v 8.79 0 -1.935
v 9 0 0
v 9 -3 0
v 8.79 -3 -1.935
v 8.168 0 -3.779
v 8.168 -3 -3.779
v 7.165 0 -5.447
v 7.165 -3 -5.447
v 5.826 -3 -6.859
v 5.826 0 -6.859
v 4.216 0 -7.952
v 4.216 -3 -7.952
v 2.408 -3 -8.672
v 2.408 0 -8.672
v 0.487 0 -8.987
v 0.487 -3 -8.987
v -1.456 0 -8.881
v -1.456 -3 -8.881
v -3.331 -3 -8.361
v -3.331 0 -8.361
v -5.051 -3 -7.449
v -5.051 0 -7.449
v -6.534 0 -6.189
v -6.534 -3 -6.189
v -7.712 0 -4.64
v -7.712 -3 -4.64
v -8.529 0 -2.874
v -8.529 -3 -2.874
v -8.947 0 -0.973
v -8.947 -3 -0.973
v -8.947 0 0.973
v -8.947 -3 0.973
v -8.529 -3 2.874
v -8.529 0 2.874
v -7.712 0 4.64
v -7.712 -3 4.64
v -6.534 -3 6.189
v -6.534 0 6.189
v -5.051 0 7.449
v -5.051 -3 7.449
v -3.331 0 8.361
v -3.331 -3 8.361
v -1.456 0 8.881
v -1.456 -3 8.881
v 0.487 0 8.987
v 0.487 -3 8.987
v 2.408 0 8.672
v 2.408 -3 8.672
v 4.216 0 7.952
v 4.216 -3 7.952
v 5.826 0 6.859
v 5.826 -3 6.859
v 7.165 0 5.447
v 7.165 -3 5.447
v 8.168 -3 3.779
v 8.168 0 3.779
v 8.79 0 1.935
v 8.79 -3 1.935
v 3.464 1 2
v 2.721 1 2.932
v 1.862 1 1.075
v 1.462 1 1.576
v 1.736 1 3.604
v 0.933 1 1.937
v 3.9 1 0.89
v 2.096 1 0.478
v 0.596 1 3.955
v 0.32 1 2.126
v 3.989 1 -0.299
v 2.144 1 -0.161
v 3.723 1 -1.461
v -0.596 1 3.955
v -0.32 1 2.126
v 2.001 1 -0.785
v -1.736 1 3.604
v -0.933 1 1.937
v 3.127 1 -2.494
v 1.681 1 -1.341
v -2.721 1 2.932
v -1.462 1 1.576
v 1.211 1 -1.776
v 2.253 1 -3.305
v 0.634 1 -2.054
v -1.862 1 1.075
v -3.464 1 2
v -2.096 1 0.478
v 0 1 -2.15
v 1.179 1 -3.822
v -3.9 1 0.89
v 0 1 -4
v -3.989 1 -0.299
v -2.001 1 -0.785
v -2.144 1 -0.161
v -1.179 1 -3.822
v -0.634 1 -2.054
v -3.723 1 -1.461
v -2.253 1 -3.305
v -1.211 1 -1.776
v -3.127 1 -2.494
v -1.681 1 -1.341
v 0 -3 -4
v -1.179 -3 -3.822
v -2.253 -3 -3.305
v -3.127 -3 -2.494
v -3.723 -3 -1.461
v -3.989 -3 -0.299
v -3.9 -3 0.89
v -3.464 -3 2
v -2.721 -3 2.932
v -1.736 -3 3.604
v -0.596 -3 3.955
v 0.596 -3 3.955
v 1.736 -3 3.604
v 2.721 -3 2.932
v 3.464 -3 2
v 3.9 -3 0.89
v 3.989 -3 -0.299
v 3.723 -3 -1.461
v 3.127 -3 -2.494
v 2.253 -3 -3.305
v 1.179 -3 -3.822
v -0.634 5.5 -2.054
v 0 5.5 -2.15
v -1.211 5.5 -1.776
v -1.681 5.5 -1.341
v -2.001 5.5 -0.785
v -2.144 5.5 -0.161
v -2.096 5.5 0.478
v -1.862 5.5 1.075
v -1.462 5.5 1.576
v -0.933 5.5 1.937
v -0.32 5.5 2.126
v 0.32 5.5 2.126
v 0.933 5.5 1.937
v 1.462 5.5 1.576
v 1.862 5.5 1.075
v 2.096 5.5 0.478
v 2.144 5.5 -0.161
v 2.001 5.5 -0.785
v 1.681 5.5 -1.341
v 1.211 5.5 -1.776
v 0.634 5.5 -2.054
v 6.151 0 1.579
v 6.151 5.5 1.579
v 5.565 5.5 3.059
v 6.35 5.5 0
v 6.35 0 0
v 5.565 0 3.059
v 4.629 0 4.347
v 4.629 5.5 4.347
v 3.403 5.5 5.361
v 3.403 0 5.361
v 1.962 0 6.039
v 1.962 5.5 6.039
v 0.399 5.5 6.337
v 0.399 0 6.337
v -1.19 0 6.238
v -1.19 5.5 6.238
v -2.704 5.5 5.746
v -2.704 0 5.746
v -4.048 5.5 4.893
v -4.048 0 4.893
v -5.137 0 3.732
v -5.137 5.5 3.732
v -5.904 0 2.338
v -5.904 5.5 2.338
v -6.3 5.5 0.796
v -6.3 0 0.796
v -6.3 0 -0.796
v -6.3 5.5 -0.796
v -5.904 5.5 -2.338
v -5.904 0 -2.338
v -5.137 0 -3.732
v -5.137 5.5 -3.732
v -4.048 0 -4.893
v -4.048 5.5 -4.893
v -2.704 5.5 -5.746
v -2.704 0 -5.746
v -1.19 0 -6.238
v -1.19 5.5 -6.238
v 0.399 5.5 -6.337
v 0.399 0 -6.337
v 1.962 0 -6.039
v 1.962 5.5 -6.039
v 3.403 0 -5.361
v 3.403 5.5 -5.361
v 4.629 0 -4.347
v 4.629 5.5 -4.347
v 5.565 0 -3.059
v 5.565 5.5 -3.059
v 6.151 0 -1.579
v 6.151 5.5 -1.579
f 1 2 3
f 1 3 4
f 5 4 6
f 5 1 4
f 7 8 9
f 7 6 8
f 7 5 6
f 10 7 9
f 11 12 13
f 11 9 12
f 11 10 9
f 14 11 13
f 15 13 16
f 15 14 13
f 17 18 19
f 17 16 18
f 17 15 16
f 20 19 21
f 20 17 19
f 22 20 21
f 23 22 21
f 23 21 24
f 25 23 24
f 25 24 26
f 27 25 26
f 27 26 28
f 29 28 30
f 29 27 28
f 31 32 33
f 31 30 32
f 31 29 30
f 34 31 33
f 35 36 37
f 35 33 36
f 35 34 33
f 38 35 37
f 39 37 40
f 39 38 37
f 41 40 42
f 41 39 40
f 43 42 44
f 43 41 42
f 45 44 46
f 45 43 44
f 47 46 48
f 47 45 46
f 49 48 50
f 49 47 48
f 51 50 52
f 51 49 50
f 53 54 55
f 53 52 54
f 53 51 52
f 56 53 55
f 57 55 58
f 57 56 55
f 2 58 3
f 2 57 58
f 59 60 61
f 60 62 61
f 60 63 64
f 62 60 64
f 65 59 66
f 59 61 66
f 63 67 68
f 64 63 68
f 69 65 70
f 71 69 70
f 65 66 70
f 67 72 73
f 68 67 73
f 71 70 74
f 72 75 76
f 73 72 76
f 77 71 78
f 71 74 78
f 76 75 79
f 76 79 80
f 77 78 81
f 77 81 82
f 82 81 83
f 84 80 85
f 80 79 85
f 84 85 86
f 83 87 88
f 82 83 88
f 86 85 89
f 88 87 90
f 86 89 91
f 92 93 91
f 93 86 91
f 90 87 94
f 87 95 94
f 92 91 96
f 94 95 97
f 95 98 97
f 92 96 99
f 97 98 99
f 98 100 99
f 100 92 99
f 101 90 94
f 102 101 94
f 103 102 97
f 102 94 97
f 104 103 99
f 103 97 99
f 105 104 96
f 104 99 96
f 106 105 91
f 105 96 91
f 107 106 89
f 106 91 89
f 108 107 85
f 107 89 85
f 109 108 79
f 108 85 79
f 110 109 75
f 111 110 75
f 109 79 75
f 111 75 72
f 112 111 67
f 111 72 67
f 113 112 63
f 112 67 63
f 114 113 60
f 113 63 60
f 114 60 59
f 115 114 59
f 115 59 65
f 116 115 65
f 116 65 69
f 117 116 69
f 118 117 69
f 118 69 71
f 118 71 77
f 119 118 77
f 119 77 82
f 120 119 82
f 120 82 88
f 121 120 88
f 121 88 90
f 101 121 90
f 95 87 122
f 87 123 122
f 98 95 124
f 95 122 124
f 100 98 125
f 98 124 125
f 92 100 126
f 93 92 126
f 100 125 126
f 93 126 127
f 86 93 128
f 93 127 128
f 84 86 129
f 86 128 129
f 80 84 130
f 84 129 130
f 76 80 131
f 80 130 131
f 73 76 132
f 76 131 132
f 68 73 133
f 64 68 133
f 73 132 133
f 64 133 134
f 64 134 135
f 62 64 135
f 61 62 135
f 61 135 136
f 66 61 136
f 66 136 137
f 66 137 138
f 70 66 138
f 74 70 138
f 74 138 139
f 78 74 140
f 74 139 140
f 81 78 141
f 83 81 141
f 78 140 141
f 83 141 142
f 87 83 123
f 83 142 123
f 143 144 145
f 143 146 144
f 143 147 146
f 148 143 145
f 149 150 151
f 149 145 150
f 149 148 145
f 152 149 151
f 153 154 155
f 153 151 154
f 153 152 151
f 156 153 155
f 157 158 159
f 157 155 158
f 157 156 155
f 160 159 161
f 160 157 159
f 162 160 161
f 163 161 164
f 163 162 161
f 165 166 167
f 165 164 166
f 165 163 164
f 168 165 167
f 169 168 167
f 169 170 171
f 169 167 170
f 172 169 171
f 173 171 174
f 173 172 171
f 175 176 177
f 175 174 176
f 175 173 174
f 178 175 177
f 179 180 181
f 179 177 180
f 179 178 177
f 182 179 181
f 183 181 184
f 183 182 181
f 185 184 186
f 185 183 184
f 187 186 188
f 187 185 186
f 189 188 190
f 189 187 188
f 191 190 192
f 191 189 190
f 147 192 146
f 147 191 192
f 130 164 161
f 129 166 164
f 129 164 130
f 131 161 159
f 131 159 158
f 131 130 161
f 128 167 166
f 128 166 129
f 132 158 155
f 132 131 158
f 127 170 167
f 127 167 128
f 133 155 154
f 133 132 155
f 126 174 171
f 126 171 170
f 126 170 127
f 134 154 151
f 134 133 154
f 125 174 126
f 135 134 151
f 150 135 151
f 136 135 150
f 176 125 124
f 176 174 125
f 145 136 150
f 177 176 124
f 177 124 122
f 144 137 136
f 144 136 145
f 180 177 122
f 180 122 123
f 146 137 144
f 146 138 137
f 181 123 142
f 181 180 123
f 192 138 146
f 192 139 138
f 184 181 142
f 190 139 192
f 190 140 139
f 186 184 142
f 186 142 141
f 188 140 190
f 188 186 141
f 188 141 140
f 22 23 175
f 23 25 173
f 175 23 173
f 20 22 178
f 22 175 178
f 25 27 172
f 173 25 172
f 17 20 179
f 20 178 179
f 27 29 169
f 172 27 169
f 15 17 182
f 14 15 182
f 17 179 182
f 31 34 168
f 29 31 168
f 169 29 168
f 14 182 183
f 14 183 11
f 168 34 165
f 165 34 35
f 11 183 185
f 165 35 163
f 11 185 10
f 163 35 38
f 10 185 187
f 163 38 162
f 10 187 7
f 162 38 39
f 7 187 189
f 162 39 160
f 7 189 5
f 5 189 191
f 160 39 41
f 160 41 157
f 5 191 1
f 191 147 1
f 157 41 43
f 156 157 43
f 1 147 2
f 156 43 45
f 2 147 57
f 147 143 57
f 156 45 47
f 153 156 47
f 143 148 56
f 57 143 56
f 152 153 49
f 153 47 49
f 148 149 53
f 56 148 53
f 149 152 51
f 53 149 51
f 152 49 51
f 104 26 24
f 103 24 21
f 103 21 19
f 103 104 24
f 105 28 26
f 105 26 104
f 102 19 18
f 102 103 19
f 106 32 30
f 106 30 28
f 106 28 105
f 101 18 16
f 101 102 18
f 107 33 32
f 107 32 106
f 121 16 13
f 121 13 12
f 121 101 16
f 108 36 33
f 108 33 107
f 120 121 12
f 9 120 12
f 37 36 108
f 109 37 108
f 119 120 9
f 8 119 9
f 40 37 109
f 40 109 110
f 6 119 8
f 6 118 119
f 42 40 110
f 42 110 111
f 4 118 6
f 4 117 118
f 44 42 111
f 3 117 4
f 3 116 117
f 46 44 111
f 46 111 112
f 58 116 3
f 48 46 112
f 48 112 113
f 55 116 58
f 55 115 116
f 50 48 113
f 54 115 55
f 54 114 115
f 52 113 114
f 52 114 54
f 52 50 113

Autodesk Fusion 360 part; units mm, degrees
sketch "Sketch1" plane through (0, 0, 0) normal (0, 1, 0) x (1, 0, 0)
  circle A0 centre (0, 0) radius 6.35
  dimension "d1" = 12.7
extrude "Extrude1" add sketch "Sketch1" along normal blind 5.5
sketch "Sketch2" plane through (0, 0, 0) normal (0, -1, 0) x (1, 0, 0)
  circle A0 centre (0, 0) radius 6.35
  circle A1 centre (0, 0) radius 9
  dimension "d4" = 18
extrude "Extrude2" add sketch "Sketch2" along normal blind 3 contours A0 | A1
sketch "Sketch3" plane through (0, -3, 0) normal (0, -1, 0) x (1, 0, 0)
  circle A0 centre (0, 0) radius 9
  circle A1 centre (0, 0) radius 2
  dimension "d7" = 4
hole "Hole1" at (0, -3, 0) direction (0, 1, 0) diameter 4.3 end through all counterbore diameter 8 counterbore depth 4
equation "d1 = 0'- 1/2\""
